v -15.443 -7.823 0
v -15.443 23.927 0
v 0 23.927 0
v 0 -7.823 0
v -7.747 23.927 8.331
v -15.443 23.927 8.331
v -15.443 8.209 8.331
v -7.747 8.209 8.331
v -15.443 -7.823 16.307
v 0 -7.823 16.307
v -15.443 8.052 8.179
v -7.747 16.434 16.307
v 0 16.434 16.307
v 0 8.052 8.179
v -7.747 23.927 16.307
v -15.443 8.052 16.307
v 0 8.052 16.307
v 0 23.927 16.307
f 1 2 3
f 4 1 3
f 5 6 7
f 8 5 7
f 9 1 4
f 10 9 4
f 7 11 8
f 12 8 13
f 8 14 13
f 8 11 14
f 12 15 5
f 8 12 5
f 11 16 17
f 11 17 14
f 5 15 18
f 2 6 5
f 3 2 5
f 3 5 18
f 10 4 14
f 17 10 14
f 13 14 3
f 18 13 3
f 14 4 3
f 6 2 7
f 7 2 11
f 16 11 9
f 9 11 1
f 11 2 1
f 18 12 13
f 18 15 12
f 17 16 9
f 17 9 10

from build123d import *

# Parameters (mm, degrees)
F0_W     = 15.4432
F0_H     = 16.129
F1_DEPTH = 16.3068
F2_W     = 15.875
F2_H     = 7.9756
F3_DEPTH = 7.6962
F5_DEPTH = 25.4


with BuildPart() as f1:
    # F0 (on Top) → F1 (new body)
    with BuildSketch(Plane.XY):
        Polygon((0, -7.8232), (0, 0), (0, 7.7978), (-15.4432, 7.7978), (-15.4432, -7.8232), align=None)
        with Locations((-7.7216, 15.8623)):
            Rectangle(F0_W, F0_H)
    extrude(amount=F1_DEPTH)

    # F2 (on face) → F3 (cut)
    with BuildSketch(Plane(origin=(-15.4432, 0, 0), x_dir=(0, -1, 0), z_dir=(-1, 0, 0))):
        with Locations((-15.9893, 12.319)):
            Rectangle(F2_W, F2_H)
    extrude(amount=-F3_DEPTH, mode=Mode.SUBTRACT)

    # F4 (on face) → F5 (cut)
    with BuildSketch(Plane.YZ):
        Polygon((16.4338, 16.3068), (8.0518, 16.3068), (8.0518, 8.1788), align=None)
    extrude(amount=-F5_DEPTH, mode=Mode.SUBTRACT)


solid = f1.part
